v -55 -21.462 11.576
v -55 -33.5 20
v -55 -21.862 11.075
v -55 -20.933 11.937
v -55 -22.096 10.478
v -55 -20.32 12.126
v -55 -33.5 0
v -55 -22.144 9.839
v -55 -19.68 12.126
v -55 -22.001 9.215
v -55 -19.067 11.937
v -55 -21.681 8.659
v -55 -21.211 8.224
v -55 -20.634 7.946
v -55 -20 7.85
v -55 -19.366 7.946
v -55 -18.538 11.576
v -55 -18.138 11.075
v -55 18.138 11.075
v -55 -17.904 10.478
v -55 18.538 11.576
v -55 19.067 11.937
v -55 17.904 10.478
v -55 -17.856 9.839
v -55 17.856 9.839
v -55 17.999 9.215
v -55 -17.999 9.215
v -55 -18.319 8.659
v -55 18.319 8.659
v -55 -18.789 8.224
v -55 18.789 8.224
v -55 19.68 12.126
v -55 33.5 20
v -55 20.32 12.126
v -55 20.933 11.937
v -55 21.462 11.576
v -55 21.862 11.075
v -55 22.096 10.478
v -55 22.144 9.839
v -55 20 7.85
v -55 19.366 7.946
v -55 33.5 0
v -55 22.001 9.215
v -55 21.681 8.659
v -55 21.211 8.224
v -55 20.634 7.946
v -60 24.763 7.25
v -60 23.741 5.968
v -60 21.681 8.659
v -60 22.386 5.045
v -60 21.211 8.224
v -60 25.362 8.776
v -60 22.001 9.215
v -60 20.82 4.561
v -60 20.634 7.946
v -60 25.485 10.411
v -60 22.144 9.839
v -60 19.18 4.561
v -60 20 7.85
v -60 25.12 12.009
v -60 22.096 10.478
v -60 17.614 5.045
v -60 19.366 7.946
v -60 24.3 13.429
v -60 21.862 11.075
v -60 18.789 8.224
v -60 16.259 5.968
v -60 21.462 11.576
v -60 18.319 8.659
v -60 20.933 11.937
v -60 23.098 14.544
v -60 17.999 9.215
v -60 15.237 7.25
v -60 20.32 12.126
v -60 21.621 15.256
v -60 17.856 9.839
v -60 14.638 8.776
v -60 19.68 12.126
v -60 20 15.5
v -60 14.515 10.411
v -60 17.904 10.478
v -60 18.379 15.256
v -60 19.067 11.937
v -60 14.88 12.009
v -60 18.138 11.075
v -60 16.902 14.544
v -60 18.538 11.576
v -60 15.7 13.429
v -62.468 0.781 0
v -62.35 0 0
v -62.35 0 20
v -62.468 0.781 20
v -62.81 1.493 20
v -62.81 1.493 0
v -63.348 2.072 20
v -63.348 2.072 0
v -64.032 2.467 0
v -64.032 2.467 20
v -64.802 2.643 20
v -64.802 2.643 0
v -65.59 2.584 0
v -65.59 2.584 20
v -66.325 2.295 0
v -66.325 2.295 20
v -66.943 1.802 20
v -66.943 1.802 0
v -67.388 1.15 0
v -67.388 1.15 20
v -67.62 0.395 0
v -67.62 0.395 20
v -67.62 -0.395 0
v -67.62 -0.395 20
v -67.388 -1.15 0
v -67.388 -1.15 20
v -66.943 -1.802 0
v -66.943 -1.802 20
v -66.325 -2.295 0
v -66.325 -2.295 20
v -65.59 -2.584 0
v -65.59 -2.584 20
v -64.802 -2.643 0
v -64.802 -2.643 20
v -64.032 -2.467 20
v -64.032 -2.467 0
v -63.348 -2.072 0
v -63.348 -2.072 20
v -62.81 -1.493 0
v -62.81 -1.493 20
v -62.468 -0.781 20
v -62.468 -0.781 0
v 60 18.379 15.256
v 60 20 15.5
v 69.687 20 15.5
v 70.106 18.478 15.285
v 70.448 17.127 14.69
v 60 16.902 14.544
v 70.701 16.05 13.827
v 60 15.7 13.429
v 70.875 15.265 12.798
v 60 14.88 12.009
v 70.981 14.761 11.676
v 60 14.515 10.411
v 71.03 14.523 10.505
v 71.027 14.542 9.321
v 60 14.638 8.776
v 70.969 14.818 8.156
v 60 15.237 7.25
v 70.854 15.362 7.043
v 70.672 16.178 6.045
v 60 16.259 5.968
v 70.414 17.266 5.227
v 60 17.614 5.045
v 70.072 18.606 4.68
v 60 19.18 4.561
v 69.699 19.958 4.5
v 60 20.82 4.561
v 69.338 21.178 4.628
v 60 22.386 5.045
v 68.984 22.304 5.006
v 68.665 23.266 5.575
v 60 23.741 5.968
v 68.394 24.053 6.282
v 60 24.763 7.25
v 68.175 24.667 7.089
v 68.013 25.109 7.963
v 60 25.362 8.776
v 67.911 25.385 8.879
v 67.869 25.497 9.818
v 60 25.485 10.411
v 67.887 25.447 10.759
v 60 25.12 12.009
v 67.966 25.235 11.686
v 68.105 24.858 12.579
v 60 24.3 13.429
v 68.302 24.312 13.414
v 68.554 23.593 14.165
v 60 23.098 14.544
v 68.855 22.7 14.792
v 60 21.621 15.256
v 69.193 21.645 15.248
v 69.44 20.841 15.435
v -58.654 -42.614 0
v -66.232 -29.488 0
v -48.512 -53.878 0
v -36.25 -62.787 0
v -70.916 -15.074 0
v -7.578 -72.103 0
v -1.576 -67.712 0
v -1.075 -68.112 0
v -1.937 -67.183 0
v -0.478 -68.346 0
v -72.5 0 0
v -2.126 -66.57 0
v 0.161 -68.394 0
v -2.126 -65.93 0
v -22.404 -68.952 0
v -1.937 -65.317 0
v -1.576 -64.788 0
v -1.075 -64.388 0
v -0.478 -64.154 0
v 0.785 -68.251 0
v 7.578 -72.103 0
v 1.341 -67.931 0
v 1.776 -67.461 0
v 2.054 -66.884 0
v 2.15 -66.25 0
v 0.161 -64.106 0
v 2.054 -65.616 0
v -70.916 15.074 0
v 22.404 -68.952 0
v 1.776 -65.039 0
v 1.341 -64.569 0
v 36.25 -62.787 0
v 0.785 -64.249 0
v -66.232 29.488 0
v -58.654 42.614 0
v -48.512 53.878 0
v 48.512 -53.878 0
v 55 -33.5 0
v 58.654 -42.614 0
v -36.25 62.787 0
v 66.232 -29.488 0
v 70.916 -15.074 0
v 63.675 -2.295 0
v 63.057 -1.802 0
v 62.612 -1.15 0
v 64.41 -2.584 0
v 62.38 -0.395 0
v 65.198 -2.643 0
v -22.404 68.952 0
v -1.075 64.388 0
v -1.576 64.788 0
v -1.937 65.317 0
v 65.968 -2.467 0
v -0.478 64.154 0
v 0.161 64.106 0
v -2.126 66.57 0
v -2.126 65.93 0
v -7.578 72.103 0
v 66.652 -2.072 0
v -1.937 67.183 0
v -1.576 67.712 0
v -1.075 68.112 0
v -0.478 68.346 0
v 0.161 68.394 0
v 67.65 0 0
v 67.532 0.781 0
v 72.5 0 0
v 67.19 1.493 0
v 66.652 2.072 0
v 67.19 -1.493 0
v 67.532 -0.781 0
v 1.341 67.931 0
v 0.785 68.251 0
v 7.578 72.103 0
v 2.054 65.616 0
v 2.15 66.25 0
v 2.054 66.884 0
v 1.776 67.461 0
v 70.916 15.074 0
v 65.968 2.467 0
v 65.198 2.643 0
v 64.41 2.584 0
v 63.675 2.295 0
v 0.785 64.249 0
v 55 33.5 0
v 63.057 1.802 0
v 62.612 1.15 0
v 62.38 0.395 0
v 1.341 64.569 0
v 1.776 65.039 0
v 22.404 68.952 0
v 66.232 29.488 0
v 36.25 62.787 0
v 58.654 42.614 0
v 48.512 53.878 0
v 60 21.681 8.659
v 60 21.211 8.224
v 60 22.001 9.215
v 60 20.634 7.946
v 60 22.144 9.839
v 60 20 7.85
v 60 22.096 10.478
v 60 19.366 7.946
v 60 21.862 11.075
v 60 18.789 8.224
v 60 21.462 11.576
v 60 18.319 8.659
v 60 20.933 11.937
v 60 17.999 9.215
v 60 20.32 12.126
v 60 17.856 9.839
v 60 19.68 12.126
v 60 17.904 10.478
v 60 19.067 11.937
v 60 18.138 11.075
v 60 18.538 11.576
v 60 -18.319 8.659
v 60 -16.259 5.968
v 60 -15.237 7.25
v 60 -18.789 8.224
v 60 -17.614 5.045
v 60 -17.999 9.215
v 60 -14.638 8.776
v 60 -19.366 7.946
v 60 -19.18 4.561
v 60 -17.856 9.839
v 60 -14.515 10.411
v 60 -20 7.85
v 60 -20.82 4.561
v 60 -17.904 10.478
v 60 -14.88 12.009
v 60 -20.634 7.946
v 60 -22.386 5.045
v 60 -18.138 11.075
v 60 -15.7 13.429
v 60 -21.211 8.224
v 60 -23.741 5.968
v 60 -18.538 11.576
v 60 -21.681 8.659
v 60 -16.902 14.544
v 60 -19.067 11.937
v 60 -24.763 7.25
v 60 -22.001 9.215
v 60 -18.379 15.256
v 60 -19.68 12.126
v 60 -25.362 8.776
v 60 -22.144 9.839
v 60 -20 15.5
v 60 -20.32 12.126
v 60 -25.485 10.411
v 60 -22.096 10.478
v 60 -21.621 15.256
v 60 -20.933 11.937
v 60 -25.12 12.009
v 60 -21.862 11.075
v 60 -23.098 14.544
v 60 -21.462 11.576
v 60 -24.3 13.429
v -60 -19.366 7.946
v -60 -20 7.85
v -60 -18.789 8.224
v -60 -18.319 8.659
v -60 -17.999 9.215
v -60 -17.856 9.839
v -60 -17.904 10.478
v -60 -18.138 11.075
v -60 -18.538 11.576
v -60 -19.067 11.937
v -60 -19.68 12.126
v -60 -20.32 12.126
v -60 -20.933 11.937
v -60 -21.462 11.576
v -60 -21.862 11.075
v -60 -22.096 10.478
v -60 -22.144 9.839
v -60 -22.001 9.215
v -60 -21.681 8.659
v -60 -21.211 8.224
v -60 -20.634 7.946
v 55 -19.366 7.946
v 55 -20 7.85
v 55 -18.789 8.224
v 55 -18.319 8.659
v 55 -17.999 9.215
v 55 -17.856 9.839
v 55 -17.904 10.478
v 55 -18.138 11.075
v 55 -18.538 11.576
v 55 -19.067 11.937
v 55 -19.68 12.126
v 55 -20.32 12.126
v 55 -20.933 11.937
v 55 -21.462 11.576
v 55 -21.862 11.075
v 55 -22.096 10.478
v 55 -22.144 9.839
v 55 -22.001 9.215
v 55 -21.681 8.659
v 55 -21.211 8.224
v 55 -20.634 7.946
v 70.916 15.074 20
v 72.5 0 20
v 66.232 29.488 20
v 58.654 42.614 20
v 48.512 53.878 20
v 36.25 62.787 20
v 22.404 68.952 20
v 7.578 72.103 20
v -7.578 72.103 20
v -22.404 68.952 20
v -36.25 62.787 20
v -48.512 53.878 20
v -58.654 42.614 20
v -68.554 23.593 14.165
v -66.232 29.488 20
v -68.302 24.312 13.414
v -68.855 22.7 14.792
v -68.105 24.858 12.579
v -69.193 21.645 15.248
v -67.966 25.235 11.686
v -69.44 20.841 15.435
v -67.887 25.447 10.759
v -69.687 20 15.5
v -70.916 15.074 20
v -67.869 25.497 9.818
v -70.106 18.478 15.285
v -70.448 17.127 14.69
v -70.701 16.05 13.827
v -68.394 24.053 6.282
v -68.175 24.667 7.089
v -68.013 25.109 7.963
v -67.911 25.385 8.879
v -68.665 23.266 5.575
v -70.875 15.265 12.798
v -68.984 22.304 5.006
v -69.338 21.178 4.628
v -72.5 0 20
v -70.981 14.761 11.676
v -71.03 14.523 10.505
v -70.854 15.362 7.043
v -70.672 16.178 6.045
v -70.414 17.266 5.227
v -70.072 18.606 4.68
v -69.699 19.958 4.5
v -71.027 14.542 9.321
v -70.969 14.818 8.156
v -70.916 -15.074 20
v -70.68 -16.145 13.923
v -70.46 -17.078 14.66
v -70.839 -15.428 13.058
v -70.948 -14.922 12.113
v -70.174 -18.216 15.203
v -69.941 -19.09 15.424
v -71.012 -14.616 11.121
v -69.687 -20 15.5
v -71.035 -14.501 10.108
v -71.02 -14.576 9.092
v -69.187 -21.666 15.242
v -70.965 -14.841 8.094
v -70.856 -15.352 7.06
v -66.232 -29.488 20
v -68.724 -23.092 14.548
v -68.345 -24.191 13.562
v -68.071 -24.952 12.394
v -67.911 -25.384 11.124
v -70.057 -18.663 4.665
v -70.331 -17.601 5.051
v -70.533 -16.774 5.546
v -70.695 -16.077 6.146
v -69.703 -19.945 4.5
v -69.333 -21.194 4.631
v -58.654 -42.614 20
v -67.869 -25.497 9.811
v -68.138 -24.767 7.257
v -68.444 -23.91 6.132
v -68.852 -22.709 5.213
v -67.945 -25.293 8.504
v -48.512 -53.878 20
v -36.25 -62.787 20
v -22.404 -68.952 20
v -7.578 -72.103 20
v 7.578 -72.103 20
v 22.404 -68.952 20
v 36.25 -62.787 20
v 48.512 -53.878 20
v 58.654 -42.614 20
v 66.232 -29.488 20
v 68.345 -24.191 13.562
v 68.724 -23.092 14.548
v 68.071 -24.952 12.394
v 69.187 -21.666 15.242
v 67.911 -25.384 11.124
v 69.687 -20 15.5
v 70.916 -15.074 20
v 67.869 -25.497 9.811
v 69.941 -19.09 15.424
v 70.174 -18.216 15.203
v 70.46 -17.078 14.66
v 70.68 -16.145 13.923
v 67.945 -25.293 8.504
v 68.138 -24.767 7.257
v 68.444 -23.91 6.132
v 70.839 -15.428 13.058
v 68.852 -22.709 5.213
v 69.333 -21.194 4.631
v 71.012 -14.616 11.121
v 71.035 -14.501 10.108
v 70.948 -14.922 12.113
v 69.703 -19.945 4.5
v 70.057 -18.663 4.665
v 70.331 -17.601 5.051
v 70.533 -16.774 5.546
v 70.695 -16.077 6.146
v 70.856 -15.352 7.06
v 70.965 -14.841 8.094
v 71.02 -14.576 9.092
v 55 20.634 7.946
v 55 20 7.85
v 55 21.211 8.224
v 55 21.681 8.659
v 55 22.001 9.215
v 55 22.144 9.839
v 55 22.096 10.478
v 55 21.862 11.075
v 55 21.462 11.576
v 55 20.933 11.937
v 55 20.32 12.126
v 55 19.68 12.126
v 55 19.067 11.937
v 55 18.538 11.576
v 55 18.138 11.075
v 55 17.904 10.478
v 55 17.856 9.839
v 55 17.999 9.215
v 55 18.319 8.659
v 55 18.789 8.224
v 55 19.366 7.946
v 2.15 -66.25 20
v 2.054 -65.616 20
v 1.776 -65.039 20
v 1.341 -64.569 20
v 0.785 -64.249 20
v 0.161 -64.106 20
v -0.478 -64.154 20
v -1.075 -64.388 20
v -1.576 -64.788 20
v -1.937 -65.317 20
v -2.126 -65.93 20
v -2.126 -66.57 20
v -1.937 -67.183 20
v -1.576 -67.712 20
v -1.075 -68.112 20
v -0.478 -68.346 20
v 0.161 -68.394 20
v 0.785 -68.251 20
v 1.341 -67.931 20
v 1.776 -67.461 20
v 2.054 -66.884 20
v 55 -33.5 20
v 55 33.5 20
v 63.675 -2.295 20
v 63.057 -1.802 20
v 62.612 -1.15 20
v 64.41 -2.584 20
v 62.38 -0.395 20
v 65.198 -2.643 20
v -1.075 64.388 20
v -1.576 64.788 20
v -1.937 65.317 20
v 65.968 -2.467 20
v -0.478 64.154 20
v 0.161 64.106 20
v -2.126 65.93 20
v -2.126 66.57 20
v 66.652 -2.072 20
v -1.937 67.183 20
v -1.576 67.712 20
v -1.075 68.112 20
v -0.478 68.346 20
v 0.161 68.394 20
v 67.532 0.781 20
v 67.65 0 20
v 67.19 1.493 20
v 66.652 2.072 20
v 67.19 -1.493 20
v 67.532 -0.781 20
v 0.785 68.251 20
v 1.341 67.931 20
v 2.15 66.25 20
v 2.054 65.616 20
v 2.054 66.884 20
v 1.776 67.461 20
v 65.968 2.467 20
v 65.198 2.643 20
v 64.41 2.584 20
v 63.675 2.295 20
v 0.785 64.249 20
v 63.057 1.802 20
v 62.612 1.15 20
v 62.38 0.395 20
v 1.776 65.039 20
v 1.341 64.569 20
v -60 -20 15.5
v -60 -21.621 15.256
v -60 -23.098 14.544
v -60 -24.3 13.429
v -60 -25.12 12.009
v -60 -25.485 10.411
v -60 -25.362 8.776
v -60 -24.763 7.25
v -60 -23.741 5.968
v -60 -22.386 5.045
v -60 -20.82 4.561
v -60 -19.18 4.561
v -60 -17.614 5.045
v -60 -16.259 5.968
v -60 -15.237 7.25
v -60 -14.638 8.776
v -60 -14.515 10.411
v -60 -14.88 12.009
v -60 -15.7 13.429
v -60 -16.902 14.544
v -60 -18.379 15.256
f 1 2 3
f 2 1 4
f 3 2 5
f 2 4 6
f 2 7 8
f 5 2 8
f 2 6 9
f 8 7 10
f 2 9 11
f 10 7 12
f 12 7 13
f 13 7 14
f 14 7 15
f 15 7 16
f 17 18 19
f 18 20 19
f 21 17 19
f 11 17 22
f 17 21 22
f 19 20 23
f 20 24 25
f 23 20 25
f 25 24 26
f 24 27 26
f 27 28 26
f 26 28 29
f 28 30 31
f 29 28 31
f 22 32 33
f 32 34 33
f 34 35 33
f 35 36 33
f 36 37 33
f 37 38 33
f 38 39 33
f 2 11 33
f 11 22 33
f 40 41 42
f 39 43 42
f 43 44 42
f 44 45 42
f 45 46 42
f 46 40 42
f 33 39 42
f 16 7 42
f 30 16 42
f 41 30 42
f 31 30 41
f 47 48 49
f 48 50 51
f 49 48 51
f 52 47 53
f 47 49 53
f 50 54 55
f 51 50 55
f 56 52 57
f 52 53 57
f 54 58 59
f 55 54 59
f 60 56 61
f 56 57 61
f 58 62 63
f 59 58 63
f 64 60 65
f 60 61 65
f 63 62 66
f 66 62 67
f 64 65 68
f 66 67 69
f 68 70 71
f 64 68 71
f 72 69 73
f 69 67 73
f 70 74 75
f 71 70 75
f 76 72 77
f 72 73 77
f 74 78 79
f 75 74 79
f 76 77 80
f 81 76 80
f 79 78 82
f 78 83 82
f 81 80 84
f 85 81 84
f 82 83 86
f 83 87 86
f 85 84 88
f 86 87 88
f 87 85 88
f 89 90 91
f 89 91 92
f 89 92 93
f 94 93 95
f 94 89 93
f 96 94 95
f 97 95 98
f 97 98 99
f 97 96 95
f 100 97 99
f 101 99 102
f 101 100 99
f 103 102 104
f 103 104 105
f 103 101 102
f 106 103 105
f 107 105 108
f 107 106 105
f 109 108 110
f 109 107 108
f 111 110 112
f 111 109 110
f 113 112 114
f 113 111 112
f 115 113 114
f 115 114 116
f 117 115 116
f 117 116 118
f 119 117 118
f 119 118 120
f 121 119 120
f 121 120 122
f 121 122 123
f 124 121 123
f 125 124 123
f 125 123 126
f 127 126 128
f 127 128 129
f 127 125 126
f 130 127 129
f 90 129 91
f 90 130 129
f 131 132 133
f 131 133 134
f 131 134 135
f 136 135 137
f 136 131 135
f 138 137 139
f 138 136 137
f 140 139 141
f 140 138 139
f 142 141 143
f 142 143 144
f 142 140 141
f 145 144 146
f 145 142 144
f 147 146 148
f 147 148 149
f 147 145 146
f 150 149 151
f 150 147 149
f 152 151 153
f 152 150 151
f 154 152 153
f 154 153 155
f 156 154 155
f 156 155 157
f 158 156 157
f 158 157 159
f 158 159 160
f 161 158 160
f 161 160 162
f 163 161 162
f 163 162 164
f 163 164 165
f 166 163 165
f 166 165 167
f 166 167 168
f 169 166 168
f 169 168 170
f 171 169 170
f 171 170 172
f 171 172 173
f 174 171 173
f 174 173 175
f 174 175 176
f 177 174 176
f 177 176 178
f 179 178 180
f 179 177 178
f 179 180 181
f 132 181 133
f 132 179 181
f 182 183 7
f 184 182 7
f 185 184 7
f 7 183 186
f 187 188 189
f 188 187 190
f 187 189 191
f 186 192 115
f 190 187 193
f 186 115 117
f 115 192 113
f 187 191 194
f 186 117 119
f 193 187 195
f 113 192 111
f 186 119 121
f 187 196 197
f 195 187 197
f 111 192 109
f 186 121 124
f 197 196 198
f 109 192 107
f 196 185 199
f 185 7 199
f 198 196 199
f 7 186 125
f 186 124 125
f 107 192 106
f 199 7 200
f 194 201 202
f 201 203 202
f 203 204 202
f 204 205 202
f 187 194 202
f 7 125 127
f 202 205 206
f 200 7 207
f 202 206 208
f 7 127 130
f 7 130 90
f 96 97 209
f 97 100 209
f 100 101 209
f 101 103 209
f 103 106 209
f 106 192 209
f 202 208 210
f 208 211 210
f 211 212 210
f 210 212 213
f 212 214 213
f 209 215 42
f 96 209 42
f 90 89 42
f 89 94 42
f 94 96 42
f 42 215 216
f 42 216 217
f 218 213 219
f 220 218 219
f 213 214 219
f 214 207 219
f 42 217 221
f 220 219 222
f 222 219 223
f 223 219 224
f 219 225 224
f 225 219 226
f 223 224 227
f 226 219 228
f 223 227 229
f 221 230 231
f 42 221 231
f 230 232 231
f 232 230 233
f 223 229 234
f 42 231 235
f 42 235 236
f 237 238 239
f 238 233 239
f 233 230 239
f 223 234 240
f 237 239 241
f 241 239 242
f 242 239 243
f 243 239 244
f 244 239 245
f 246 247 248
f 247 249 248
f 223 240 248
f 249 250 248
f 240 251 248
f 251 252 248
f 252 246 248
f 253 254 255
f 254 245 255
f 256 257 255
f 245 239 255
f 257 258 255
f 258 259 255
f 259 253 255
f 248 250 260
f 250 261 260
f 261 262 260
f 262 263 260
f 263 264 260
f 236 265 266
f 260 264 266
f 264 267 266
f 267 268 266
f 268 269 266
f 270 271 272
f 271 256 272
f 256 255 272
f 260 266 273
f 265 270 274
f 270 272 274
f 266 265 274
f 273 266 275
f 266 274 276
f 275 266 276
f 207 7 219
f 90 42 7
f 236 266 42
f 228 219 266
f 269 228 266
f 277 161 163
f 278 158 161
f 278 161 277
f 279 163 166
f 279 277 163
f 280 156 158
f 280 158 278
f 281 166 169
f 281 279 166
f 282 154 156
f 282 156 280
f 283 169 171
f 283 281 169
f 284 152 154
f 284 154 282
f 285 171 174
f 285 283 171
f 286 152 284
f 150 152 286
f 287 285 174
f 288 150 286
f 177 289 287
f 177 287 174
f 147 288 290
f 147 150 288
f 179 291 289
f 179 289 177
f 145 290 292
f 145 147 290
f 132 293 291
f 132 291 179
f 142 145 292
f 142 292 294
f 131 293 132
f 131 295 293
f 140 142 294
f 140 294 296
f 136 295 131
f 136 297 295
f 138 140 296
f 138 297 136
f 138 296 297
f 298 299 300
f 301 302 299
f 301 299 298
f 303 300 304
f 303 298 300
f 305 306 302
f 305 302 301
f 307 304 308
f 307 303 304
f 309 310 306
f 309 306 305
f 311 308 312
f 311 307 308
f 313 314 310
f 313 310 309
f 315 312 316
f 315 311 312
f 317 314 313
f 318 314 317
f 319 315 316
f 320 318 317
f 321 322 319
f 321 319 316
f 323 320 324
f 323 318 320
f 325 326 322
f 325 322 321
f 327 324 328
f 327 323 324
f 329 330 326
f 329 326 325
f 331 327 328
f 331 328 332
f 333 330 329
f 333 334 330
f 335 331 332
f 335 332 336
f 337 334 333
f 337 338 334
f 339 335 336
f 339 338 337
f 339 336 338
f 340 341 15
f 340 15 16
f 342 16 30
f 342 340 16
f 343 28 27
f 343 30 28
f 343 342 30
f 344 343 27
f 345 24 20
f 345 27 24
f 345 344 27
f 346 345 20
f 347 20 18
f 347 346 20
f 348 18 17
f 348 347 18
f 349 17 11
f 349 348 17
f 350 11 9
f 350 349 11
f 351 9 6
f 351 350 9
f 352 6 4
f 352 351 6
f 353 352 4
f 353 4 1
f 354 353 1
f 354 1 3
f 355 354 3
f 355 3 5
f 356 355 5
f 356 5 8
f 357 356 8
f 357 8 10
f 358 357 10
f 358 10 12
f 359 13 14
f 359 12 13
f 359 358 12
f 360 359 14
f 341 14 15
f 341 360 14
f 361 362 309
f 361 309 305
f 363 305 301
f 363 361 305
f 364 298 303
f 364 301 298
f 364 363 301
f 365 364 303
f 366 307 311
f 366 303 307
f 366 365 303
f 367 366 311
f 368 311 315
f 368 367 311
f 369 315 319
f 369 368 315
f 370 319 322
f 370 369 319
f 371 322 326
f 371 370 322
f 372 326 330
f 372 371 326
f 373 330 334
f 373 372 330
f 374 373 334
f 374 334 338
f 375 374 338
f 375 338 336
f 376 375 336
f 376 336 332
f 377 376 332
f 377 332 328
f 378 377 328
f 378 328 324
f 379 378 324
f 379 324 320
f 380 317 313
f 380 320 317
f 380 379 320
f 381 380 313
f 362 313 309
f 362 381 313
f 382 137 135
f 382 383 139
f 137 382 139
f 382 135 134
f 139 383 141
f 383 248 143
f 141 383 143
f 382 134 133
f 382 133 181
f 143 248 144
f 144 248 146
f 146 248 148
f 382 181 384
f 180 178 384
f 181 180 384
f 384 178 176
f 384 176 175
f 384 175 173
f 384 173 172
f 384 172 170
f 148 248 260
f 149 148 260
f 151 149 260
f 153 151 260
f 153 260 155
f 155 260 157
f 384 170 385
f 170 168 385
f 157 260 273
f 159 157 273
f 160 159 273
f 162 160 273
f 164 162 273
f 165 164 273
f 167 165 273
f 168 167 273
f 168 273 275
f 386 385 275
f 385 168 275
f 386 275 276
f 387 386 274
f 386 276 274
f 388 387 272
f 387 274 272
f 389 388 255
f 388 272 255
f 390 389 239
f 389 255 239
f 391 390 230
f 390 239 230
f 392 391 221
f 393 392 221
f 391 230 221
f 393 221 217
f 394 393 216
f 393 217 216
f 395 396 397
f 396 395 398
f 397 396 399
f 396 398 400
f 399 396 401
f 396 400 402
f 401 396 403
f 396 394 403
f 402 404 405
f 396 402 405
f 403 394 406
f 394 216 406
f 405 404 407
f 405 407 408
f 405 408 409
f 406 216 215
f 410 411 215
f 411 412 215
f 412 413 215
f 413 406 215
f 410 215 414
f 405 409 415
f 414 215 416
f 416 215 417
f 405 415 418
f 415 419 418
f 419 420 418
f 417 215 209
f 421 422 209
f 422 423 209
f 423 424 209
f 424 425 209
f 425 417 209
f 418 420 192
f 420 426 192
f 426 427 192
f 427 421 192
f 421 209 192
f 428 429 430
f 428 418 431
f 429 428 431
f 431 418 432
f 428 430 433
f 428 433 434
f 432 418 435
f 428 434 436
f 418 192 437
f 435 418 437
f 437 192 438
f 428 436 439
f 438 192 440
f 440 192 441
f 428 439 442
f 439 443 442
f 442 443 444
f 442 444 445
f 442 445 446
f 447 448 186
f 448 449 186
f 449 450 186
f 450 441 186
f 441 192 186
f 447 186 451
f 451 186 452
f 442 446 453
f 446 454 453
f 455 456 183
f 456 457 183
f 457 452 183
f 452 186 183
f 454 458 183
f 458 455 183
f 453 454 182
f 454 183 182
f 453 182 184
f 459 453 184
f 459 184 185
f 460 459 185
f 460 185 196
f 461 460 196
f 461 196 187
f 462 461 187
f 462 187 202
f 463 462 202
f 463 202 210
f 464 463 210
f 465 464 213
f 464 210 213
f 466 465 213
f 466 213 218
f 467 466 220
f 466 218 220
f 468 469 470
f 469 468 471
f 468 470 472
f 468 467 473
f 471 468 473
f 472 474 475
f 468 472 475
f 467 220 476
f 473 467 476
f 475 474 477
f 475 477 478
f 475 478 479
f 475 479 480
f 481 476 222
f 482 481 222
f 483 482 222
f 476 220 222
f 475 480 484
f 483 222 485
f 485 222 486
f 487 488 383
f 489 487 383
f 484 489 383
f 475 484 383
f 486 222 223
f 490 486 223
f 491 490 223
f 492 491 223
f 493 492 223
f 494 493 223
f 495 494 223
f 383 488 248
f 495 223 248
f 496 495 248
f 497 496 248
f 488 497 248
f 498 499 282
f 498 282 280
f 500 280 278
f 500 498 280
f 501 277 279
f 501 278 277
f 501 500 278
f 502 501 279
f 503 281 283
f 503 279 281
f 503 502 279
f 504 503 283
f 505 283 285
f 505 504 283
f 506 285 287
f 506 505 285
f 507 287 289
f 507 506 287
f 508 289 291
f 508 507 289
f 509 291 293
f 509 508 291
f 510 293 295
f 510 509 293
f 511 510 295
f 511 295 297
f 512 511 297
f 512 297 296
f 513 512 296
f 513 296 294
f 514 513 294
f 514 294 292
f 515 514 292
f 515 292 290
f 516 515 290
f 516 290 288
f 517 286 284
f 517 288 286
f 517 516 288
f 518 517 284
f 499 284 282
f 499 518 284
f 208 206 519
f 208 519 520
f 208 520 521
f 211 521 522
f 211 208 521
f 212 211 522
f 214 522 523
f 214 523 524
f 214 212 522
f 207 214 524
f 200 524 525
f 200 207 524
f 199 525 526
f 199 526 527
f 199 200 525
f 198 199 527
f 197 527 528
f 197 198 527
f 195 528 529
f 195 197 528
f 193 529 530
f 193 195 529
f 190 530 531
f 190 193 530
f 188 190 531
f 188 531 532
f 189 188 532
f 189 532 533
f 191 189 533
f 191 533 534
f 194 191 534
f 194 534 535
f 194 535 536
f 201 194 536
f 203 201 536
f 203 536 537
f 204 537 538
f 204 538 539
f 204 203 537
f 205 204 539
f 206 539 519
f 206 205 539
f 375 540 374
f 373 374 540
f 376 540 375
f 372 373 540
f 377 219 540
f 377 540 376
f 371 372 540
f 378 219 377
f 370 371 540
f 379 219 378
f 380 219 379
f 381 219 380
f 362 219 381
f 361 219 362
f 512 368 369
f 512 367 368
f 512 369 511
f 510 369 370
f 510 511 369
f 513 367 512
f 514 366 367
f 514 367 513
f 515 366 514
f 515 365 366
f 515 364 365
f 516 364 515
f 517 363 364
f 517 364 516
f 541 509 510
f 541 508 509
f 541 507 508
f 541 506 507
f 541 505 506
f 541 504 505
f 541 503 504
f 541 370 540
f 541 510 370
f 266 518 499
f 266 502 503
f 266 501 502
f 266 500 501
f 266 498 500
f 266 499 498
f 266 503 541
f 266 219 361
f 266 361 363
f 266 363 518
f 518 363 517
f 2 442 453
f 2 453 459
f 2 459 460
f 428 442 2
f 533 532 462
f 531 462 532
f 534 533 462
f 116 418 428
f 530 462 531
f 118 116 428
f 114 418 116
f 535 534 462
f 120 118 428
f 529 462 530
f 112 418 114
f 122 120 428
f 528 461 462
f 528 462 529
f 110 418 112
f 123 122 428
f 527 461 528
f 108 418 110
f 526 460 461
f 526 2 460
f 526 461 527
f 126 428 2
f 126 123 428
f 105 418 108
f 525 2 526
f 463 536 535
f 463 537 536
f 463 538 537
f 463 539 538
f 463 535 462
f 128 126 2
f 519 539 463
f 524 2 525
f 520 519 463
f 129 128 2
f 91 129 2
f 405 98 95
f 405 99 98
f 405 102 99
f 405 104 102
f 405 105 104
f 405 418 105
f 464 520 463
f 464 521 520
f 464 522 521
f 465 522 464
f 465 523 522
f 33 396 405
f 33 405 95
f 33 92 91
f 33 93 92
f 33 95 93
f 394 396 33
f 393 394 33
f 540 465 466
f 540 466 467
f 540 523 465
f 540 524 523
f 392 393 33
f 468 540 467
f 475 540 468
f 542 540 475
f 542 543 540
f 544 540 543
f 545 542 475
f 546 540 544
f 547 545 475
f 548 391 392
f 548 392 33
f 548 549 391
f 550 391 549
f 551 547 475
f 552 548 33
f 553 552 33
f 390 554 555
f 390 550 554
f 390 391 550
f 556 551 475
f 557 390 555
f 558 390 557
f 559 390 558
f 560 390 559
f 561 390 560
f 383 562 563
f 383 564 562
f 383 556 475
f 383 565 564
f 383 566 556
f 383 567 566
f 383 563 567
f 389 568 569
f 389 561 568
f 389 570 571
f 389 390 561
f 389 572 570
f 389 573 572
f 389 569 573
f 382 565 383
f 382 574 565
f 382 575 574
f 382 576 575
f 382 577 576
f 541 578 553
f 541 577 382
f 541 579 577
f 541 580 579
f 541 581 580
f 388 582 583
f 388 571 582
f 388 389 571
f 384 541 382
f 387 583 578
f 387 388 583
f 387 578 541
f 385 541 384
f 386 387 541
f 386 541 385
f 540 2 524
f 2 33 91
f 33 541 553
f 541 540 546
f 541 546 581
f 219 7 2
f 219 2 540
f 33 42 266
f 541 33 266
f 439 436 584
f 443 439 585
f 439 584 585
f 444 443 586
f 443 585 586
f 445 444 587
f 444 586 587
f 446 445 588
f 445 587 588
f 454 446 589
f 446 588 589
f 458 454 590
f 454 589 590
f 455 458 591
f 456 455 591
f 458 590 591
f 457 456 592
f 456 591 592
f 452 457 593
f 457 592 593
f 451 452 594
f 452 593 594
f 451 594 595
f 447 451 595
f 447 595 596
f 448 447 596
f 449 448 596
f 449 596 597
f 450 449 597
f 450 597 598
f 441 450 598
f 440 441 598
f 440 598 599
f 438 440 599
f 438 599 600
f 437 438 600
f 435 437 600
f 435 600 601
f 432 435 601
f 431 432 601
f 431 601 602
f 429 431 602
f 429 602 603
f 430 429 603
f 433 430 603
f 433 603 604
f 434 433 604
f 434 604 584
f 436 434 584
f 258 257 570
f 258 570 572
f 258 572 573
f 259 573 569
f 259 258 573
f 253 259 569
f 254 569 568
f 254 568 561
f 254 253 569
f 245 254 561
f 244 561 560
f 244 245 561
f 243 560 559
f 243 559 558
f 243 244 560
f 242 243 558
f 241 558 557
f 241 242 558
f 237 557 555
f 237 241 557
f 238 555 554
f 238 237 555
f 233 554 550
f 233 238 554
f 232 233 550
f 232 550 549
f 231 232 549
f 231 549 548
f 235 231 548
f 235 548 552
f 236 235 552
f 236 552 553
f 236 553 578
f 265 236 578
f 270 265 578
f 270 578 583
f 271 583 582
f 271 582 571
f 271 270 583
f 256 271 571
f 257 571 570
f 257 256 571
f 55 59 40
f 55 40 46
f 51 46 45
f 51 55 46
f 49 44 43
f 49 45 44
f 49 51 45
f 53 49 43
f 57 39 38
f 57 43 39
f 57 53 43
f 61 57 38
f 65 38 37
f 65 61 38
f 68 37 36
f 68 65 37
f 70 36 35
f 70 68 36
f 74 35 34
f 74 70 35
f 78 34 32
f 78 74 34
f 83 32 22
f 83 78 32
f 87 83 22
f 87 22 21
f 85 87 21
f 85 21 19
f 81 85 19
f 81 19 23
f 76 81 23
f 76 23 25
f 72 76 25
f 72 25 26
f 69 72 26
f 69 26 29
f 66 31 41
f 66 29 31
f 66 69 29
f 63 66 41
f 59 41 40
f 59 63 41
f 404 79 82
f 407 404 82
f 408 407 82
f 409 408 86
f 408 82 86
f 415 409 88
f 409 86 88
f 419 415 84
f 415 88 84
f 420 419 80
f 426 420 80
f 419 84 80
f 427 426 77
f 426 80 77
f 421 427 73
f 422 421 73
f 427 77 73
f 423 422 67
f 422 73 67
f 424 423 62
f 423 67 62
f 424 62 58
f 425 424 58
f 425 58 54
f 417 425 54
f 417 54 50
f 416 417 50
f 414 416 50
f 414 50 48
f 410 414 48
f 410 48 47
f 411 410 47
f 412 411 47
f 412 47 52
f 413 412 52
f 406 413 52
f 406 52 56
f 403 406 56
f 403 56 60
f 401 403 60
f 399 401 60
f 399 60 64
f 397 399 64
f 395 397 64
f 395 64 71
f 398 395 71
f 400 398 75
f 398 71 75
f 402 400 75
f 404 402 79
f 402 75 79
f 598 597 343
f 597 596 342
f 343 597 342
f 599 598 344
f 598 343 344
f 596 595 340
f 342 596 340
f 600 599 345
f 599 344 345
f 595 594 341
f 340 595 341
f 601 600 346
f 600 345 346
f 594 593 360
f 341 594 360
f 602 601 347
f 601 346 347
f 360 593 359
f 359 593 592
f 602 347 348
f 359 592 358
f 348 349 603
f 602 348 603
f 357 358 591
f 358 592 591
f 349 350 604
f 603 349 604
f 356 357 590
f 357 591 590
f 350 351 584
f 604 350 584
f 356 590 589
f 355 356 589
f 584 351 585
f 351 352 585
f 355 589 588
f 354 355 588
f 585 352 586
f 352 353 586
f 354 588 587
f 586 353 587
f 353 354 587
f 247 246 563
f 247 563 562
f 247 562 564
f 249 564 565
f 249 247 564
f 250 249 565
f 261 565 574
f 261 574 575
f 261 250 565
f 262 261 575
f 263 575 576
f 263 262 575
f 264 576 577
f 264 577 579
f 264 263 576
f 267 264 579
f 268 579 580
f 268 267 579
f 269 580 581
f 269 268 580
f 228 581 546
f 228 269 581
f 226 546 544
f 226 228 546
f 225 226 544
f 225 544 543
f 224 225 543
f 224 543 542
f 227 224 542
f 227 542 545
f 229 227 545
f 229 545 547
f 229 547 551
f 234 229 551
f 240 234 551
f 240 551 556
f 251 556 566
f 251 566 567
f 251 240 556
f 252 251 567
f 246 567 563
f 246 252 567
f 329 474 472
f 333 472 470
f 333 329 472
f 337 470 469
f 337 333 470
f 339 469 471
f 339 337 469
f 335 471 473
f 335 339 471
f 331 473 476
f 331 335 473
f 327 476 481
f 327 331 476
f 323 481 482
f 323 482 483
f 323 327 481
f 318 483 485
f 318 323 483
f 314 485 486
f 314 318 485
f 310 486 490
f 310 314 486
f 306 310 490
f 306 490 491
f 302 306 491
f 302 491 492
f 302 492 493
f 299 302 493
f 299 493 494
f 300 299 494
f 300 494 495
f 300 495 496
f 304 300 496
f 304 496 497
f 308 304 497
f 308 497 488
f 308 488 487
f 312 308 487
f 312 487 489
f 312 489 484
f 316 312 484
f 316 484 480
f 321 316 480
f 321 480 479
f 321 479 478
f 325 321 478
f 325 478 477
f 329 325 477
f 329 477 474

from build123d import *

# Parameters (mm, degrees)
SKETCH_3_R               = 72.5
SKETCH_3_R_2             = 2.15
SKETCH_3_W               = 110
SKETCH_3_H               = 67
SKETCH_3_R_3             = 2.65
EXTRUDE_2_DEPTH          = 20
CUT_EXTRUDE_2_DEPTH      = 149.028713431
CUT_EXTRUDE_2_DEPTH_BACK = 149.028713431
SKETCH_5_R               = 2.15
SKETCH_6_R               = 5.5
CUT_EXTRUDE_4_DEPTH      = 153.35649


with BuildPart() as part:
    # 草图3 → 凸台-拉伸2 (new body)
    with BuildSketch(Plane.XY):
        Circle(SKETCH_3_R)
        with Locations((0, -66.25)):
            Circle(SKETCH_3_R_2, mode=Mode.SUBTRACT)
        Rectangle(SKETCH_3_W, SKETCH_3_H, mode=Mode.SUBTRACT)
        with Locations((0, 66.25)):
            Circle(SKETCH_3_R_2, mode=Mode.SUBTRACT)
        with Locations((65, 0)):
            Circle(SKETCH_3_R_3, mode=Mode.SUBTRACT)
        with Locations((-65, 0)):
            Circle(SKETCH_3_R_3, mode=Mode.SUBTRACT)
    extrude(amount=EXTRUDE_2_DEPTH)

    # 草图5 → 切除-拉伸2 (cut, two sides: drawn at the far end of the back side and taken through both)
    with BuildSketch(Plane(origin=(-55, 0, 0), x_dir=(0, 0, -1), z_dir=(1, 0, 0)).offset(-CUT_EXTRUDE_2_DEPTH_BACK)):
        with Locations((-10, 20)):
            Circle(SKETCH_5_R)
        with Locations((-10, -20)):
            Circle(SKETCH_5_R)
    extrude(amount=CUT_EXTRUDE_2_DEPTH + CUT_EXTRUDE_2_DEPTH_BACK, mode=Mode.SUBTRACT)

    # 草图6 → 切除-拉伸4 (cut, through all)
    with BuildSketch(Plane(origin=(60, 0, 0), x_dir=(0, 0, -1), z_dir=(1, 0, 0))):
        with Locations((-10, 20)):
            Circle(SKETCH_6_R)
        with Locations((-10, -20)):
            Circle(SKETCH_6_R)
    cut_extrude_4 = extrude(amount=CUT_EXTRUDE_4_DEPTH, mode=Mode.SUBTRACT)

    # 镜向1: 切除-拉伸4 across plane
    add(cut_extrude_4.mirror(Plane(origin=(0, 0, 0), x_dir=(0, 0, 1), z_dir=(1, 0, 0))), mode=Mode.SUBTRACT)


solid = part.part
